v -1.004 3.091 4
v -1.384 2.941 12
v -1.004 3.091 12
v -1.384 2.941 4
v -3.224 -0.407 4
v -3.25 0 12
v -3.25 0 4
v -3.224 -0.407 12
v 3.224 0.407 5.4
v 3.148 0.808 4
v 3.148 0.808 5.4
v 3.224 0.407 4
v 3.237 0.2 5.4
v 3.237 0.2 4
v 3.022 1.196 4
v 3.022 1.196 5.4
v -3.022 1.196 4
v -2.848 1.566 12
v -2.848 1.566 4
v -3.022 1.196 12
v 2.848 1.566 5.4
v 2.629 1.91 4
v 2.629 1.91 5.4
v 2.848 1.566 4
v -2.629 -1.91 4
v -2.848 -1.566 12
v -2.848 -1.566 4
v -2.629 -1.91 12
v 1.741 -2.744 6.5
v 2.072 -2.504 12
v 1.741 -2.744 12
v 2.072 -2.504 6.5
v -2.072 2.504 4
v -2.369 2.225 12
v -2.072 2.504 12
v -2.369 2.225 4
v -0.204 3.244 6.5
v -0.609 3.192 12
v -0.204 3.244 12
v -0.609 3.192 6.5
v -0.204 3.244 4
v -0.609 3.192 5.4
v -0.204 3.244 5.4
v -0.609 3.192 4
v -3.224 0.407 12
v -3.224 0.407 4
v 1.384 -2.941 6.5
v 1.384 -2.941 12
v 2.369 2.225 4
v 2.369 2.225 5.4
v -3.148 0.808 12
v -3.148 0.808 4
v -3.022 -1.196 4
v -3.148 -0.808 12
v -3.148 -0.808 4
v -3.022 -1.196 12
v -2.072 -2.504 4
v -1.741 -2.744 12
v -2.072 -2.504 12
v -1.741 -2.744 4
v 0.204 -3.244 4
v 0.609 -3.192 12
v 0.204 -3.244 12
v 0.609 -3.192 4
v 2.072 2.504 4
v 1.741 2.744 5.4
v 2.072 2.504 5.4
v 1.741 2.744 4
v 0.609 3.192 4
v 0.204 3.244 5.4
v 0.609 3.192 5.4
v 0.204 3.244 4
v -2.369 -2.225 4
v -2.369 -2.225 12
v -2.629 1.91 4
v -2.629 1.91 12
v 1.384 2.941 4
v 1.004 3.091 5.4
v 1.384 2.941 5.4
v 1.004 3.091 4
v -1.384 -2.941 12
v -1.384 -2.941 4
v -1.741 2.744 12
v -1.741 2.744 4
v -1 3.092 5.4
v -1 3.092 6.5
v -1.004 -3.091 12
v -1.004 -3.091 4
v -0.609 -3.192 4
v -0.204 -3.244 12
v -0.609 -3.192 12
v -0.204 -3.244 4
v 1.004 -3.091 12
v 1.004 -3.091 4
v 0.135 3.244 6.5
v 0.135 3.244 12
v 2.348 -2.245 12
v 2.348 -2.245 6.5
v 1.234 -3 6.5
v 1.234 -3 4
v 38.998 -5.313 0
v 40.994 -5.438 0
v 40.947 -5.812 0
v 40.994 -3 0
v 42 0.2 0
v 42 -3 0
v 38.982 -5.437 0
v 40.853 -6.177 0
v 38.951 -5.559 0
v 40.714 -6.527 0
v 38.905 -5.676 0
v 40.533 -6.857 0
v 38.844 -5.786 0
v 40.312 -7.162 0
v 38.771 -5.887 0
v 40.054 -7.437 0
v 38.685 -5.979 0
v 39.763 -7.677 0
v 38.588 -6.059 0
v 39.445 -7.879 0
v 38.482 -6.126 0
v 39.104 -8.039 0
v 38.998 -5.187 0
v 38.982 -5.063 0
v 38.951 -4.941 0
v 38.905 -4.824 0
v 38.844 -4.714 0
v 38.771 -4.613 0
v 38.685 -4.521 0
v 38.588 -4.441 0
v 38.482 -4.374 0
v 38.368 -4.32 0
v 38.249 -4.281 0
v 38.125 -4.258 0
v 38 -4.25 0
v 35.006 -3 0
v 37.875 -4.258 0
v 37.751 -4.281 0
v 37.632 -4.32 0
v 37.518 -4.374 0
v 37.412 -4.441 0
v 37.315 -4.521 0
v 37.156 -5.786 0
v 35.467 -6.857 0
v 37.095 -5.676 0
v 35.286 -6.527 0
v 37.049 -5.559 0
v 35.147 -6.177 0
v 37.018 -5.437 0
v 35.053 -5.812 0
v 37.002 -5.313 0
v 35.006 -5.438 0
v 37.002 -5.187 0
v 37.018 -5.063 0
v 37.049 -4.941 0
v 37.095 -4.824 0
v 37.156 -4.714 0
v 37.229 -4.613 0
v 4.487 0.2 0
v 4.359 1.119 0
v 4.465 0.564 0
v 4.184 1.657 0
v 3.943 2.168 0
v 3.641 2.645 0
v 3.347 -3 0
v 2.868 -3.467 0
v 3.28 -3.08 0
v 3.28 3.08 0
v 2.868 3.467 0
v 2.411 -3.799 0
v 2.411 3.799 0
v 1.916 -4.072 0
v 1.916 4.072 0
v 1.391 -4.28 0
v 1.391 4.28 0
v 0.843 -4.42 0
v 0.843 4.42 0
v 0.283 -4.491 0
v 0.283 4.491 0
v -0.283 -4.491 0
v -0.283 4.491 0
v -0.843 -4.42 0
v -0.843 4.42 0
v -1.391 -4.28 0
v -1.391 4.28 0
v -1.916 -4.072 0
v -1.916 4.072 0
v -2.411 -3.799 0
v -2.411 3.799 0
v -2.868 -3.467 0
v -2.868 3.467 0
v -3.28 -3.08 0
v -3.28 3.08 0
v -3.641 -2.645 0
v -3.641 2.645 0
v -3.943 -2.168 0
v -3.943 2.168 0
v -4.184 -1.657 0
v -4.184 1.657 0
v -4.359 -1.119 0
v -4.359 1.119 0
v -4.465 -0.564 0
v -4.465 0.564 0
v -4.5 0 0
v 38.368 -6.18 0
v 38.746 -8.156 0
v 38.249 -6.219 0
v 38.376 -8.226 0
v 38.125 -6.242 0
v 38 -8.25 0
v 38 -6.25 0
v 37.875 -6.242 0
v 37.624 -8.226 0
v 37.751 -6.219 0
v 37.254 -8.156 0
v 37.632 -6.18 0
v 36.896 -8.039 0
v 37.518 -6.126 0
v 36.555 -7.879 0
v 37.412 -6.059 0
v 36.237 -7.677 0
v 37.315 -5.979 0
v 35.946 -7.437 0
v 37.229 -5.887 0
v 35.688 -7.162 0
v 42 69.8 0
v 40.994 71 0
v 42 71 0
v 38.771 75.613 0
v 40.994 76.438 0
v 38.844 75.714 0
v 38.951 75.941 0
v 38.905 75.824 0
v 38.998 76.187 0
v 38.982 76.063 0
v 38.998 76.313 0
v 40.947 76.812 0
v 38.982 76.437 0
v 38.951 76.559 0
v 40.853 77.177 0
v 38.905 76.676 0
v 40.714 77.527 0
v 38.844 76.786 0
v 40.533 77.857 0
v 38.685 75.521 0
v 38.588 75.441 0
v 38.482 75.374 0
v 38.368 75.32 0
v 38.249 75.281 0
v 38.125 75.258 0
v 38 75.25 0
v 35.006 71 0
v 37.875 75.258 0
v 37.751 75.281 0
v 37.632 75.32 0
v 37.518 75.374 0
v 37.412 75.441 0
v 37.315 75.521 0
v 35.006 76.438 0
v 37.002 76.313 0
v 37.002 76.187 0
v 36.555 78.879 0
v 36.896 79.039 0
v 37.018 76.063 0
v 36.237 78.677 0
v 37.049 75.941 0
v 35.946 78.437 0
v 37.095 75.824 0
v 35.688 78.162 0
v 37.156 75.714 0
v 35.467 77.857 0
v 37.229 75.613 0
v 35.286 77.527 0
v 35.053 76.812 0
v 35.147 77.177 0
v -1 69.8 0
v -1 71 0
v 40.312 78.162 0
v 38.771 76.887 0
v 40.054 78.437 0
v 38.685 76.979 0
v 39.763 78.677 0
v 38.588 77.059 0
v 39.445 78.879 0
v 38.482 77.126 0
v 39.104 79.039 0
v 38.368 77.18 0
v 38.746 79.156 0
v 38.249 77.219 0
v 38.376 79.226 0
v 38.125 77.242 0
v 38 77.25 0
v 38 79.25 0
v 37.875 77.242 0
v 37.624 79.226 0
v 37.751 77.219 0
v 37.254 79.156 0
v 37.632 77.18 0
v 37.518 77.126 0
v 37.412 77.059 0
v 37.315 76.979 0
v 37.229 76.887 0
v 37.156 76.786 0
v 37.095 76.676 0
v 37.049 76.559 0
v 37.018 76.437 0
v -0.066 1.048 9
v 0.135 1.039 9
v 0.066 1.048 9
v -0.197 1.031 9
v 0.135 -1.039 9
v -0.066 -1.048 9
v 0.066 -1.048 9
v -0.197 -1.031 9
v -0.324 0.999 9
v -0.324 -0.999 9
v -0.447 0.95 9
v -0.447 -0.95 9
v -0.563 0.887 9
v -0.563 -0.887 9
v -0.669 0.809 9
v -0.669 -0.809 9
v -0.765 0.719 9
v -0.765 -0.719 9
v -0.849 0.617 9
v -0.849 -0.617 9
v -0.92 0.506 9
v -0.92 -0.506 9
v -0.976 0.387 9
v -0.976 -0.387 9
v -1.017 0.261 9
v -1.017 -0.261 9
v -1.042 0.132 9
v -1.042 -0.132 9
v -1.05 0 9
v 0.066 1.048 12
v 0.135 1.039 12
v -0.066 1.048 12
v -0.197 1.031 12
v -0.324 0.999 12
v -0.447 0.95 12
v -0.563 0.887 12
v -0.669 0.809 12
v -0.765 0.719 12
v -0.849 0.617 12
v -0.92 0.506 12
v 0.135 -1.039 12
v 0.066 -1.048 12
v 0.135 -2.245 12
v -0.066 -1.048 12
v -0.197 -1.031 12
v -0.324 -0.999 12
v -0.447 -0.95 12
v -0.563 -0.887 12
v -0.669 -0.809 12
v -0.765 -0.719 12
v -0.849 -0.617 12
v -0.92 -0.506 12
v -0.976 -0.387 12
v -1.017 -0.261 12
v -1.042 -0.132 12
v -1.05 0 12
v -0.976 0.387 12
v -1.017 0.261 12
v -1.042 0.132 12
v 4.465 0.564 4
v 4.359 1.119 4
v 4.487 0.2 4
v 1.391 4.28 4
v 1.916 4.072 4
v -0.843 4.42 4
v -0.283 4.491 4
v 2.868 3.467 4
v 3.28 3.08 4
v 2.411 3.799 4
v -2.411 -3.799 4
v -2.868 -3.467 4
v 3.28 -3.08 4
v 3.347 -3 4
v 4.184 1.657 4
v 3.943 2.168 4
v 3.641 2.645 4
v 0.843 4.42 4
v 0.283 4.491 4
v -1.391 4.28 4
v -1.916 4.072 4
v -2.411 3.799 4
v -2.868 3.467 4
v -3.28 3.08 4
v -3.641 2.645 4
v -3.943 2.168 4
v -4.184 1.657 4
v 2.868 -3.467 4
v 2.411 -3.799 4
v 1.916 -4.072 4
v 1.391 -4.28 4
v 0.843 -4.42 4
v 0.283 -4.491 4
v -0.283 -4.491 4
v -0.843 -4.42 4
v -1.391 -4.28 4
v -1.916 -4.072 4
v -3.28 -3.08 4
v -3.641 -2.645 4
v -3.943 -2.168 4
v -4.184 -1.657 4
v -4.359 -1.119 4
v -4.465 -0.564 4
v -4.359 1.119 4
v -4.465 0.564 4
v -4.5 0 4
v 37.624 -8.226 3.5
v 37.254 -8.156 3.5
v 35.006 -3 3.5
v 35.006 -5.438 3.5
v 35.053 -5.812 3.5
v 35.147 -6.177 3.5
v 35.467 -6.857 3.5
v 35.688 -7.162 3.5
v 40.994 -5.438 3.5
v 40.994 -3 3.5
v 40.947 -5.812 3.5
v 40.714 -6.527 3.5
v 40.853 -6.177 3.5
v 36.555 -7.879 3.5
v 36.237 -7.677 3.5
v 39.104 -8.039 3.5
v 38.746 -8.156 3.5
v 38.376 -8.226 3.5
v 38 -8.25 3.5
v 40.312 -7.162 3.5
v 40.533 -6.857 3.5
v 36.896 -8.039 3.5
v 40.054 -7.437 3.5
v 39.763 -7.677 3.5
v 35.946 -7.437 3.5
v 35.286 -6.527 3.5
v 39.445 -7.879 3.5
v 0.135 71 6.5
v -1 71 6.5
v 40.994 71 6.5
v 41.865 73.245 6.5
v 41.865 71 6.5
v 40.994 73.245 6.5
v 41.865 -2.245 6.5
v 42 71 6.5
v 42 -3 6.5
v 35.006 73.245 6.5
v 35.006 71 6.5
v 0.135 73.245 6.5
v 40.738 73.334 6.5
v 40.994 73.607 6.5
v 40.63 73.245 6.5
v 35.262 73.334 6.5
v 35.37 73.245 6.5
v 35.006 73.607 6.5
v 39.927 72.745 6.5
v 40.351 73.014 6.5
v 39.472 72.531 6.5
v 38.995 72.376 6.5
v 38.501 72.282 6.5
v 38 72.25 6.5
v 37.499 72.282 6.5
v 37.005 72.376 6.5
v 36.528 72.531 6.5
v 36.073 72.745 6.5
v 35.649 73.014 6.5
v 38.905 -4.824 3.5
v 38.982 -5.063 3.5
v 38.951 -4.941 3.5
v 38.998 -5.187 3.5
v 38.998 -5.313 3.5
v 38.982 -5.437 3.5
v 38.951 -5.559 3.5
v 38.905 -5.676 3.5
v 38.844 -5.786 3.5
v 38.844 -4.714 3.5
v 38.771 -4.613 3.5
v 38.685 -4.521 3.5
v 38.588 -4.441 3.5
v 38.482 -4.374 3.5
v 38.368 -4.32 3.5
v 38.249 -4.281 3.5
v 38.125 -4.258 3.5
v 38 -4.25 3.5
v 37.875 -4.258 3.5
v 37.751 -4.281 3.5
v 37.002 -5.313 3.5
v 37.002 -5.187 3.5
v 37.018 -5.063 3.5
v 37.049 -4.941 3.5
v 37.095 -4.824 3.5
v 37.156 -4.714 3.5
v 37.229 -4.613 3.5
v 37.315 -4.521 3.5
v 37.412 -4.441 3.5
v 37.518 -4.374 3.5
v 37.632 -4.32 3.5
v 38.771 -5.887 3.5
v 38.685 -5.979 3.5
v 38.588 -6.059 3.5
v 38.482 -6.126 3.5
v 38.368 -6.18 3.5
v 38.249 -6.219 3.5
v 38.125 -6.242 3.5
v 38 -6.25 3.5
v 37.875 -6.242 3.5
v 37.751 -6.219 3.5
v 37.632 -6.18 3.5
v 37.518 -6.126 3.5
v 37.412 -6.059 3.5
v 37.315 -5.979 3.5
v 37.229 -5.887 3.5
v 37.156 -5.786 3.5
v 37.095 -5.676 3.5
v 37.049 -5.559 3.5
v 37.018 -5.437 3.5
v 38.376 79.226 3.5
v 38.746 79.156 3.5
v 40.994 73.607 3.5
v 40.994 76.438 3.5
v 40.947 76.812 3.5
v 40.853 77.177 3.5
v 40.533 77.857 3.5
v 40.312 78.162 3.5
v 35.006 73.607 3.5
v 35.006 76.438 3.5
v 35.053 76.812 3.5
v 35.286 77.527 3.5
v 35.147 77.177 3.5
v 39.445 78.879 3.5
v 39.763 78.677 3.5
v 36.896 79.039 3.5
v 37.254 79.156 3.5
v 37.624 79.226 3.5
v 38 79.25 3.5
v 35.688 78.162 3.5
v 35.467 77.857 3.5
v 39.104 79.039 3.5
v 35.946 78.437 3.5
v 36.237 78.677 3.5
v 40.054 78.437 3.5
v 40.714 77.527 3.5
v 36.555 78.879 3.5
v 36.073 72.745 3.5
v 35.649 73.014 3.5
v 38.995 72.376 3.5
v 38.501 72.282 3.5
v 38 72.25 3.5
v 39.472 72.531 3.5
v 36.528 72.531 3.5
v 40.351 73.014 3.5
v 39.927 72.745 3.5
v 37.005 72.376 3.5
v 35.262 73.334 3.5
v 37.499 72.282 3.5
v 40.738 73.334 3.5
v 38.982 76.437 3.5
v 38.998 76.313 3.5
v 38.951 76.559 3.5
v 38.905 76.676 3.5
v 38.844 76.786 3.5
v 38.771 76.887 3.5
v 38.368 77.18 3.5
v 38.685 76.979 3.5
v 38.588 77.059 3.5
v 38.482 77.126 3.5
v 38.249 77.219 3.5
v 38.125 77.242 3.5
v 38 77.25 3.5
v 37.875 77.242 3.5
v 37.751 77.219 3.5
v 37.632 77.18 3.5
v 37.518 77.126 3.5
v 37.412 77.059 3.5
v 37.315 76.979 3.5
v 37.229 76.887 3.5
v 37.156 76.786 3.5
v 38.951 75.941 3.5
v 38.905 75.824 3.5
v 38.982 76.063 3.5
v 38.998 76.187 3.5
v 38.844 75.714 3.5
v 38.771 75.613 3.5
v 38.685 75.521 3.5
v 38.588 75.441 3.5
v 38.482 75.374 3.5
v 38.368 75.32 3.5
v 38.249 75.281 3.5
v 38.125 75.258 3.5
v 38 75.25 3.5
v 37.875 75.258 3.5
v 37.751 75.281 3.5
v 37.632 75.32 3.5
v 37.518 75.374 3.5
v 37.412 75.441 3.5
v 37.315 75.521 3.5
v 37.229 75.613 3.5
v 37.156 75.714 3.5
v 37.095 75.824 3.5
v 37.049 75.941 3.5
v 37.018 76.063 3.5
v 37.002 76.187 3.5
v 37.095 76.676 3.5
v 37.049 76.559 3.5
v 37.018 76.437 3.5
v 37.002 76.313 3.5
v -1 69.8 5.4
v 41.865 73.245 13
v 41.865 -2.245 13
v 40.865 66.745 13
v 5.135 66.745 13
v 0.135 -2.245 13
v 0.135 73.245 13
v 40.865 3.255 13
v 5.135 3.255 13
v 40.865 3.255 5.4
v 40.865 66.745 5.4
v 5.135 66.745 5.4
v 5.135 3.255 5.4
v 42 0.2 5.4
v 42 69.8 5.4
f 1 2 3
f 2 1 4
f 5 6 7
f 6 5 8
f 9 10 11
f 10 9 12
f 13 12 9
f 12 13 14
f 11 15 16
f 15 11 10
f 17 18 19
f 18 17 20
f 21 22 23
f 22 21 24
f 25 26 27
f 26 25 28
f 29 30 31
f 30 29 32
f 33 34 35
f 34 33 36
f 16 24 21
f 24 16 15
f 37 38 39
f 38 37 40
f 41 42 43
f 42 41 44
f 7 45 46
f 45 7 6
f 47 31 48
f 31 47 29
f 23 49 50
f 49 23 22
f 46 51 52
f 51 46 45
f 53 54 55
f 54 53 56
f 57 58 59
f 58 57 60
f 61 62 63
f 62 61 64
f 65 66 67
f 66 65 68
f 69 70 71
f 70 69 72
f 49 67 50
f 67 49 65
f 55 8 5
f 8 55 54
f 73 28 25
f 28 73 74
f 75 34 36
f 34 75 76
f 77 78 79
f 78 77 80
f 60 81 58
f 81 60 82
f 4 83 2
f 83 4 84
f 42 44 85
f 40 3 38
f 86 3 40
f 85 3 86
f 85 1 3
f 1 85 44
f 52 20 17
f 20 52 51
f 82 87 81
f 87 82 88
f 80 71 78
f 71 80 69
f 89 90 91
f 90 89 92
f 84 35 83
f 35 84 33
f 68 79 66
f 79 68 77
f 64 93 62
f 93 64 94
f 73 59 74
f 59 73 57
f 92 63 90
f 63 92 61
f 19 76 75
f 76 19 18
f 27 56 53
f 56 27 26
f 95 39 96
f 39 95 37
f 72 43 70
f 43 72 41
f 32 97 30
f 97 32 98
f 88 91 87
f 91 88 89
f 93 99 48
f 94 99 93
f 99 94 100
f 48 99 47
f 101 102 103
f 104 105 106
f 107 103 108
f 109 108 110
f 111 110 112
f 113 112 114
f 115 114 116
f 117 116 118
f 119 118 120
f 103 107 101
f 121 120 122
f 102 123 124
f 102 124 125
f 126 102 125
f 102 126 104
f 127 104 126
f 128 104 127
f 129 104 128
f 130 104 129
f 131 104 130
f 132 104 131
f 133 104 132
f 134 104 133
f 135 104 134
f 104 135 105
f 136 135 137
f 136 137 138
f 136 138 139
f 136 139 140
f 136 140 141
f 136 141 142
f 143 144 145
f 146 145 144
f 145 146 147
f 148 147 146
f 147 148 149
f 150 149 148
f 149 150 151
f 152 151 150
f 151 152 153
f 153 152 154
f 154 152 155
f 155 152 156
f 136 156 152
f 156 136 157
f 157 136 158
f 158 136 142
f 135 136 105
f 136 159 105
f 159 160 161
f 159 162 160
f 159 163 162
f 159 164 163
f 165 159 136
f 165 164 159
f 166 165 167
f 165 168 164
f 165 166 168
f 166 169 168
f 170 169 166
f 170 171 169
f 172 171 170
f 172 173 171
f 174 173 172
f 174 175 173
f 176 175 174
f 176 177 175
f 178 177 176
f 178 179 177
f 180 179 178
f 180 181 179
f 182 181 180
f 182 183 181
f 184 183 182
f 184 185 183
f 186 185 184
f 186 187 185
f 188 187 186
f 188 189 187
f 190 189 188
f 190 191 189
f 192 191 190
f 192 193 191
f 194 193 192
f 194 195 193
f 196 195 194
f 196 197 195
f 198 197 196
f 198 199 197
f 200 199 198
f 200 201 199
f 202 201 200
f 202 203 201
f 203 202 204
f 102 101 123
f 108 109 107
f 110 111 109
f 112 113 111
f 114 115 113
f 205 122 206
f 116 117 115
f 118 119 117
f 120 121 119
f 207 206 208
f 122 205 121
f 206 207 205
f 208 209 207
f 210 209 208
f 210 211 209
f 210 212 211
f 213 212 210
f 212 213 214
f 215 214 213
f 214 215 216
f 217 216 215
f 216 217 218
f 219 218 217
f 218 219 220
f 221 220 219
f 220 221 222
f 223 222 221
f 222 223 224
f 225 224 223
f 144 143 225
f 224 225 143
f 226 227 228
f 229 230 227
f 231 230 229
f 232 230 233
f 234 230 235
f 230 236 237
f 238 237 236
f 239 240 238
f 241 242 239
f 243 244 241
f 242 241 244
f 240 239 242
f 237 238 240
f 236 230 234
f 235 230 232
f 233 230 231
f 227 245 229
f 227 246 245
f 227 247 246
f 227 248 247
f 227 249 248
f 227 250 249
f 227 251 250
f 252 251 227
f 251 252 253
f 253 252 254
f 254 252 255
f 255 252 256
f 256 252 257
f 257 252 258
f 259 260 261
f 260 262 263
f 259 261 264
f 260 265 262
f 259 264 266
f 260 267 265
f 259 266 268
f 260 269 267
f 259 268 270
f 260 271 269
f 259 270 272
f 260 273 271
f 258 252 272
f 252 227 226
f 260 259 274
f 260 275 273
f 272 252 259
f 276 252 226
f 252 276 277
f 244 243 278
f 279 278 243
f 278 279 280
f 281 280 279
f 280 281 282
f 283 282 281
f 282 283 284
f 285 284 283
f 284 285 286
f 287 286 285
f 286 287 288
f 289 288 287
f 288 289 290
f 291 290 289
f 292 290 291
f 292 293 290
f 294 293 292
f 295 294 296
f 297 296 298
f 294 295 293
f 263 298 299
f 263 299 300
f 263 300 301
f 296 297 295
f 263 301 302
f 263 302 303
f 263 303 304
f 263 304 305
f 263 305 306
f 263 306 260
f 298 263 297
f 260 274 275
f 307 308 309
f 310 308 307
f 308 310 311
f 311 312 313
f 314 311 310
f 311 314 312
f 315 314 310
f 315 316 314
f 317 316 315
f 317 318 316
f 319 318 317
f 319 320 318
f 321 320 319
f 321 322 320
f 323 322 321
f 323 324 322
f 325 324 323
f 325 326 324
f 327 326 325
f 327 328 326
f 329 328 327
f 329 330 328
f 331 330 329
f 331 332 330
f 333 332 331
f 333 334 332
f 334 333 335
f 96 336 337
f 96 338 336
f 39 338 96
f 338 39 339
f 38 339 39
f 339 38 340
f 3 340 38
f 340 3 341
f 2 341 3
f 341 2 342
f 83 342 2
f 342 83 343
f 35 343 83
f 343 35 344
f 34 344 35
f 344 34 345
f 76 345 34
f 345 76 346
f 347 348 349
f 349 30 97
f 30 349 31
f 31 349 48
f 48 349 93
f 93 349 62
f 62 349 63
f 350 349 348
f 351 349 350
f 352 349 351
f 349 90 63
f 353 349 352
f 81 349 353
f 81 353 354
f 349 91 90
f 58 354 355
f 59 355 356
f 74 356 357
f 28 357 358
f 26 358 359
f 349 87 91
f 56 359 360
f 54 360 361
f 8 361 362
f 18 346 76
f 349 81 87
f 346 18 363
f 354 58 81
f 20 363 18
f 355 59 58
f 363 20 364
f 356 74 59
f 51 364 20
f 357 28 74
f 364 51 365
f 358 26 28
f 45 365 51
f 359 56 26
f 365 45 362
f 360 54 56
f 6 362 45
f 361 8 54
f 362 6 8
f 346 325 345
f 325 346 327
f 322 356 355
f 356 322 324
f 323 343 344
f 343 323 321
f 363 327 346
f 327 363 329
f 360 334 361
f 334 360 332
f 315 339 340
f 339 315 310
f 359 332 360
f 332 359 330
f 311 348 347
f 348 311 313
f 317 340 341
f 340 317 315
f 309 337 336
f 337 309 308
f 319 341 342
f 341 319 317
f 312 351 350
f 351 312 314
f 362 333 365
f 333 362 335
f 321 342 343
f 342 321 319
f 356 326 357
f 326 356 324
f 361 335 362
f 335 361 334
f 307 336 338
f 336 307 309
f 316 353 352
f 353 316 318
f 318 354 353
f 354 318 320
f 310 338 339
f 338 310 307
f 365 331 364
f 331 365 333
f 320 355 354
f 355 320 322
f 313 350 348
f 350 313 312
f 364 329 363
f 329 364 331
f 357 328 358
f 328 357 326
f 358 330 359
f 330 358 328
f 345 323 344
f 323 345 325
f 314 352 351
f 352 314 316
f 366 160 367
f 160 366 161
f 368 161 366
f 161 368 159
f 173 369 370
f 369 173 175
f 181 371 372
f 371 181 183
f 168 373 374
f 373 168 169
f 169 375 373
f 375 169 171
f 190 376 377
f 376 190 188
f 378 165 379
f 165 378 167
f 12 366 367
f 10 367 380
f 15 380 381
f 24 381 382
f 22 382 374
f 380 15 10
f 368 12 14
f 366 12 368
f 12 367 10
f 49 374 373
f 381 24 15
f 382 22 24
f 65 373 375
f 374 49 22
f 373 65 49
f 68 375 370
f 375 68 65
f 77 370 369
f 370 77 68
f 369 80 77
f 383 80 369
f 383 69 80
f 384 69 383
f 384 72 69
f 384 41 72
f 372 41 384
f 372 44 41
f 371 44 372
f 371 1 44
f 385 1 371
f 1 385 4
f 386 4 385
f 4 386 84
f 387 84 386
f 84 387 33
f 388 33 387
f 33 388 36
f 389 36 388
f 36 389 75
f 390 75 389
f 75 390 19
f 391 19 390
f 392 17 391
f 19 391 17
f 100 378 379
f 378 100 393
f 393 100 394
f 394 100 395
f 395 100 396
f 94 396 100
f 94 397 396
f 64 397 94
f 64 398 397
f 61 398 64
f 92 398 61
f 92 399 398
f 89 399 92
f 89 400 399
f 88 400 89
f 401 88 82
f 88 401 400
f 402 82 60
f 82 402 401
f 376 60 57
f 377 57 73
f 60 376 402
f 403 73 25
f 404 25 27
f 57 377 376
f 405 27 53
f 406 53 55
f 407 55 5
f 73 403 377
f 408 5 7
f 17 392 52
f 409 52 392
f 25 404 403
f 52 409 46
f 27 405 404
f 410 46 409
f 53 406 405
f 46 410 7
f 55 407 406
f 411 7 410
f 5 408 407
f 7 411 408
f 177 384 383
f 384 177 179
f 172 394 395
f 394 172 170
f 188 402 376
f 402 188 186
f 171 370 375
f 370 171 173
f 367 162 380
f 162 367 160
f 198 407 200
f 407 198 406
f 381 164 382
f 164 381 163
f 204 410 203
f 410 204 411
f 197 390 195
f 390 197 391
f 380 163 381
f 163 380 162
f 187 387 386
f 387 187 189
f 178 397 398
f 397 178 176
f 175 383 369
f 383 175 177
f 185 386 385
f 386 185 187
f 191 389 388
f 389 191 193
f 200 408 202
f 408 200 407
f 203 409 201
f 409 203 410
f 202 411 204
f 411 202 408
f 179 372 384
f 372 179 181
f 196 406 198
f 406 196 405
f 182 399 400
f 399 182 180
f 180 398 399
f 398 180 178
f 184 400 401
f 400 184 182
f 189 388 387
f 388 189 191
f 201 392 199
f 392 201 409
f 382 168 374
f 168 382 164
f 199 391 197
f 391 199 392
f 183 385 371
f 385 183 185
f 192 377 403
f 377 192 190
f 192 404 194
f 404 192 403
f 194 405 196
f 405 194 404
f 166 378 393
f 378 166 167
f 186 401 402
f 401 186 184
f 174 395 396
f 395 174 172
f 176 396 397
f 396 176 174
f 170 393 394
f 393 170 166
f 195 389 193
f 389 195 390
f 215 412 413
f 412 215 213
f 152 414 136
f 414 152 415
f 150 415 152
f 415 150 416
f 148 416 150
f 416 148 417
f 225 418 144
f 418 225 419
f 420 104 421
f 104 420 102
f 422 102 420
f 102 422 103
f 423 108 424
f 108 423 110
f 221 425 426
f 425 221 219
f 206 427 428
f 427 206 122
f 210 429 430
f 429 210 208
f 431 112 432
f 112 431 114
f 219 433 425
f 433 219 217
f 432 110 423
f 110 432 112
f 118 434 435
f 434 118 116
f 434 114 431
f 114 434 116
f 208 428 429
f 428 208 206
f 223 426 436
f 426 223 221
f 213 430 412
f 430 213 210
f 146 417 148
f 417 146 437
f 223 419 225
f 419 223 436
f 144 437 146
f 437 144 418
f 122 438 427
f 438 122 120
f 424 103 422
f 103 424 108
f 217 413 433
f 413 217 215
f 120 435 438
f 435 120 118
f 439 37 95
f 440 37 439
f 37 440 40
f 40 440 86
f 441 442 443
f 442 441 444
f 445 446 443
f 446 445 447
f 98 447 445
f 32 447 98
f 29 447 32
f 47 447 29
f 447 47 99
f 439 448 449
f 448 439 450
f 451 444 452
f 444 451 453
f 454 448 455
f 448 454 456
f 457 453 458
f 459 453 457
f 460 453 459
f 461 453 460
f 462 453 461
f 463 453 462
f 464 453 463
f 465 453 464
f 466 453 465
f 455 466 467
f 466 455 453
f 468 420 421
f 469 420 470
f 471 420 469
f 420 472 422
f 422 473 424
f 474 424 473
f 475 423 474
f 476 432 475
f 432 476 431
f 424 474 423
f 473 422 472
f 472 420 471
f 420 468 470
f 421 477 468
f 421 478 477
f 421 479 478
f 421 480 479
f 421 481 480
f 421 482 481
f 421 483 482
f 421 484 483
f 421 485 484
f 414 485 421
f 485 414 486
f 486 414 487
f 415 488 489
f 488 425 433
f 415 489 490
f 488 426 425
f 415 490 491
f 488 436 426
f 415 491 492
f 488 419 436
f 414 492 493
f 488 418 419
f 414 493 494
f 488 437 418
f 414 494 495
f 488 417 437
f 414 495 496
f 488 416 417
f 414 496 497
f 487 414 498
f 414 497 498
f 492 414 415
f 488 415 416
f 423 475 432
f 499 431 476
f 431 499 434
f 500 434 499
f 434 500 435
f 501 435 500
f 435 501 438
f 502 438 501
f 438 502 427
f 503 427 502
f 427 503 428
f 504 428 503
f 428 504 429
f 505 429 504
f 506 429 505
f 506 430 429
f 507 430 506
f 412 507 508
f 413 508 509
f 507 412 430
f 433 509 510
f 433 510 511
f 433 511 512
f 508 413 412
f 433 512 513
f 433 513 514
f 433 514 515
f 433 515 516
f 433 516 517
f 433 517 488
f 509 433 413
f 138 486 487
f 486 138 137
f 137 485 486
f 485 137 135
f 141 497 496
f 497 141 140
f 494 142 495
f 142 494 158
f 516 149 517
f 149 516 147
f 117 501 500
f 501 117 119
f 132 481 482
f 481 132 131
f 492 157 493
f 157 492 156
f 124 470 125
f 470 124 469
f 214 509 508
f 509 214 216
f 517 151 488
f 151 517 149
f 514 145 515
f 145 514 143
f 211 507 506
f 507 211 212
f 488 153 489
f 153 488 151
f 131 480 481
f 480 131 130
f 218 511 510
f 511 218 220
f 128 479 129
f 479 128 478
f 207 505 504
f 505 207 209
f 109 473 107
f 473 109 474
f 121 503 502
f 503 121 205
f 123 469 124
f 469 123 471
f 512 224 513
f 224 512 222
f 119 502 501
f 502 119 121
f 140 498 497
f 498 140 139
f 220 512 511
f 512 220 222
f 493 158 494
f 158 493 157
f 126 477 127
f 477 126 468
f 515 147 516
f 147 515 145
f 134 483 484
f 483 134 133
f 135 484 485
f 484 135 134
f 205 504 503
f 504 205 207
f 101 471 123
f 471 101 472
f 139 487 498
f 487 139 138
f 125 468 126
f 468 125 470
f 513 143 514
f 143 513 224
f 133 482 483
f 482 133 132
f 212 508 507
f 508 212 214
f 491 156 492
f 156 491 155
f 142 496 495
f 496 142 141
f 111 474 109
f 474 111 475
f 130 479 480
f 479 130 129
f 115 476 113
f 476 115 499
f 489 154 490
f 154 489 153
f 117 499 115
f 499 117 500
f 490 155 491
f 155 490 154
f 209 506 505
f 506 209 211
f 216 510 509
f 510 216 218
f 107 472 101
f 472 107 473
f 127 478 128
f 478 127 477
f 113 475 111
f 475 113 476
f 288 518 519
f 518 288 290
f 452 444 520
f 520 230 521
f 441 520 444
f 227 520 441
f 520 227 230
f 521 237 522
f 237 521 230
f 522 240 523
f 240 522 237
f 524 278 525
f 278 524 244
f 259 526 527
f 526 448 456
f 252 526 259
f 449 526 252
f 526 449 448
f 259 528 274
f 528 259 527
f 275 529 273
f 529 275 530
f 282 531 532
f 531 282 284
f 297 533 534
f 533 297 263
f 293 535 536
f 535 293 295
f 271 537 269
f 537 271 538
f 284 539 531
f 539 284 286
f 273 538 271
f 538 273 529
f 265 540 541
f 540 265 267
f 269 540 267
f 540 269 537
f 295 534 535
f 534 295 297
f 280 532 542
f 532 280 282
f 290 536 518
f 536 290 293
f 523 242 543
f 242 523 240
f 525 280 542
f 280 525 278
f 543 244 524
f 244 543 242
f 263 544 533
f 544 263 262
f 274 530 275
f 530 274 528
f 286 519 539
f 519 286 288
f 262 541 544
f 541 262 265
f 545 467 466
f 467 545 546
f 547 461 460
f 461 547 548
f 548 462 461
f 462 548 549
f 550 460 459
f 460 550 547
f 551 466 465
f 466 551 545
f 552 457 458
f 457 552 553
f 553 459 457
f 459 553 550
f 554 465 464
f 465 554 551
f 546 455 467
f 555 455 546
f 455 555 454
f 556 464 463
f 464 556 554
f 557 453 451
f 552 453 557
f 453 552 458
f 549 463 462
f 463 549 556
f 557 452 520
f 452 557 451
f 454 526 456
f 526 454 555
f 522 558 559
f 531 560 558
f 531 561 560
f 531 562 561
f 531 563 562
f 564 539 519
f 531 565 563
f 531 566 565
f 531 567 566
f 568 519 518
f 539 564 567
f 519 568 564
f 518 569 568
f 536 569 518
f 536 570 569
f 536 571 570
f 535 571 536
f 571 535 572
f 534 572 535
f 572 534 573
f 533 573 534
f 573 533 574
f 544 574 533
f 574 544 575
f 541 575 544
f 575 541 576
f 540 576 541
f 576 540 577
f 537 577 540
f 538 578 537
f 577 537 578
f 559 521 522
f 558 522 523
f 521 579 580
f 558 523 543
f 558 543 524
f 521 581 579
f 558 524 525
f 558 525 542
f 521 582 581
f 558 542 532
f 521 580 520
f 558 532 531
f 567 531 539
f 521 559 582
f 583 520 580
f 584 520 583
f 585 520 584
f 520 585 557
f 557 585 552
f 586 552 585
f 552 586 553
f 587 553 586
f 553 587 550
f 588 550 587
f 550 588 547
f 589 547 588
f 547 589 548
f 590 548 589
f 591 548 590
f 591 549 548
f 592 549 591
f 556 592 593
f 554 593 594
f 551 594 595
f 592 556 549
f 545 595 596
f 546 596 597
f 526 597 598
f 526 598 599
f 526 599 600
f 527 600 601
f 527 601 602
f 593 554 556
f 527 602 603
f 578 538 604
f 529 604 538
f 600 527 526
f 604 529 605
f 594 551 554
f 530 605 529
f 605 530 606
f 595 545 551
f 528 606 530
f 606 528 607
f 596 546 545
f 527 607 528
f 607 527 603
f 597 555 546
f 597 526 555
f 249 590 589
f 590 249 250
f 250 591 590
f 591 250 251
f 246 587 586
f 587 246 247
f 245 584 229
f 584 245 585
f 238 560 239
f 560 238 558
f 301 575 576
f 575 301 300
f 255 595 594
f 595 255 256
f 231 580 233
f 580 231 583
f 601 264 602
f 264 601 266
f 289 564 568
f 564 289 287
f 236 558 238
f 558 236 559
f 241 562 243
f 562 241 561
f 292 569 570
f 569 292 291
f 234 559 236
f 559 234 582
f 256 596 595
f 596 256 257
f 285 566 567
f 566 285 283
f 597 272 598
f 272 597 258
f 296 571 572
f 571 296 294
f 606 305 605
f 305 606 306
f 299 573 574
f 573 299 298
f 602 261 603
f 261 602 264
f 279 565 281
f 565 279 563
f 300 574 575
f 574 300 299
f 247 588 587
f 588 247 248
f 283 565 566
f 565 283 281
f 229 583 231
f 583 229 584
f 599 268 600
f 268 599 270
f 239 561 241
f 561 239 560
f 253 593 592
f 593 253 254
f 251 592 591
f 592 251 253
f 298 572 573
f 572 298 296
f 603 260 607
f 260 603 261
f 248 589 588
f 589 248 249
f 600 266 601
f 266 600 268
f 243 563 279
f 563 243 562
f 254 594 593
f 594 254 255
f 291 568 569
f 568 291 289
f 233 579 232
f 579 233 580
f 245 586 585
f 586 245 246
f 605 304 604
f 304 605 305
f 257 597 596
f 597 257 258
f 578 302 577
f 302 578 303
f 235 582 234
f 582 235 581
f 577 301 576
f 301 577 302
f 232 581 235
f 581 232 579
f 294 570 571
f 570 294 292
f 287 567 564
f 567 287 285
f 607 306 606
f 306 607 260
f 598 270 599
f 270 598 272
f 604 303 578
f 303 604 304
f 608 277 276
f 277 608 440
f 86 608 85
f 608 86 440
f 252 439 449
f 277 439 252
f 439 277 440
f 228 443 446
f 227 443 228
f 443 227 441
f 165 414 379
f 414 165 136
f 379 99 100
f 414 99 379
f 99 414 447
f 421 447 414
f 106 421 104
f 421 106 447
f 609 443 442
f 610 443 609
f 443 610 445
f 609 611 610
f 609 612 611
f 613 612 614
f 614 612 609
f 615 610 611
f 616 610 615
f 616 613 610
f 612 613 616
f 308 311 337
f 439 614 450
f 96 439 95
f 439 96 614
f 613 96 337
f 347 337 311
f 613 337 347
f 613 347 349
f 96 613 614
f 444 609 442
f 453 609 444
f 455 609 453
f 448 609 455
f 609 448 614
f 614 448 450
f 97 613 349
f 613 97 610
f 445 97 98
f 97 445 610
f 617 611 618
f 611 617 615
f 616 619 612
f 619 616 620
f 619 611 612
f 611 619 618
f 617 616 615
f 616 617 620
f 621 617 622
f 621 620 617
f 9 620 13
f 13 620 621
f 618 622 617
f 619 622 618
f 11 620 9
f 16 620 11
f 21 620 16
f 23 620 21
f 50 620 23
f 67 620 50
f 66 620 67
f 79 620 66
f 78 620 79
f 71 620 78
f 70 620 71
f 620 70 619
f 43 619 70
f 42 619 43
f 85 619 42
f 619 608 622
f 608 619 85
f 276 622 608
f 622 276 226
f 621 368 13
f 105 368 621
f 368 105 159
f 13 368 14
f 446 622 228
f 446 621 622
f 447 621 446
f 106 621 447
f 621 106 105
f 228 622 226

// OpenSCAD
$fn=50;
outer_x = 60;
outer_y = 72;

aperture_x = 50.3;
aperture_y = 69.6;

height = 4;


viewport_x = 29.73+2;
viewport_y =59.49;
screen_clearance = 4;

rim_thickness = 6;

module mounting_lug(ht) {
    difference() {
       hull() {
        cylinder(d=6,h=ht);
        translate([6,0,0]) cylinder(d=6,h=ht);
       }
       translate([0,0,3.5]) cylinder(d=8,h=10);
       translate([0,0,-1]) cylinder(d=2,h=10);
   }
}

module main_bracket() {
difference() {
union() {
    translate([-1,-3,0]) cube([outer_x,outer_y+2,height+2.5]);




//50mm apart

//outer y= 72. So, 11 in.
/*translate([-4,(outer_y - 50)/2,0]) {
    mounting_lug(height+2.5);
    translate([0,50,0]) mounting_lug(height+2.5);
}*/


//holes are 80mm apart.

translate([0,-5.25,0]) {
    translate([38,0,0]) rotate(90) mounting_lug(height+2.5);
    translate([38,81.5,0]) rotate(270) mounting_lug(height+2.5);
}

//the raised lip
 translate([(0 + outer_x - (viewport_x+ screen_clearance)) /2 - 12, -1 + (outer_y - (viewport_y + screen_clearance))/2-5.5,height+2.5]) cube([viewport_x + screen_clearance + rim_thickness, viewport_y + screen_clearance + rim_thickness + 6, height+2.5]);


}






//the screen viewing window

 translate([(0 + outer_x - (viewport_x+ screen_clearance)) /2 - 7, -1 + (outer_y - (viewport_y + screen_clearance))/2,]) cube([viewport_x + screen_clearance, viewport_y + screen_clearance, 50]);


//the aperture
    translate([(outer_x - aperture_x) /2 -10 ,-1  +(outer_y - aperture_y) /2 ,-0.1]) cube([aperture_x, aperture_y, height + 2.5 -1]);
    
    

//chops the bottom off.
translate([52,-5,-0.1]) cube([100,100,100]);

//for the f4...
//translate([42,-3,0]) #cube([12,10,10]);
//translate([42,65,0]) #cube([12,10,10]);
translate([42,-10,0]) #cube([10,100,10]);



}
}


//main_bracket();


module button_ext() {
    union() {
        cylinder(d=4.25, h=2);    
        cylinder(d=3.5, h=9);
    }
}

module pcb_extender(height, collar=0) {
    
        

    
    if (collar) {
    
    union() {
        translate([0,0,3]) difference() {
            cylinder(d=6.5, h=height);
            cylinder(d=2.1, h=height+10);
        }
    
        difference() {
            cylinder(d=9, h=4);
            translate([0,0,-0.001]) cylinder(d=6.4, h = 10);
            translate([0,0,-0.001]) cylinder(d=2.1, h = 10);

        }
    }
    }
    else {
        difference() {
            cylinder(d=6.5, h=height);
            cylinder(d=2.1, h=height+10);
            }
    }
    
}



//button_ext();
/*pcb_extender(9);
translate([7,7,0]) pcb_extender(9);

translate([7,0,0]) pcb_extender(6);
translate([0,7,0]) pcb_extender(6);

*/

// eight of these needed
pcb_extender(9,1);
//2 of these needed
pcb_extender(9,0);
//2 of these needed
pcb_extender(6,0);

//four button_exts needed
button_ext();
//1 of:

main_bracket();
